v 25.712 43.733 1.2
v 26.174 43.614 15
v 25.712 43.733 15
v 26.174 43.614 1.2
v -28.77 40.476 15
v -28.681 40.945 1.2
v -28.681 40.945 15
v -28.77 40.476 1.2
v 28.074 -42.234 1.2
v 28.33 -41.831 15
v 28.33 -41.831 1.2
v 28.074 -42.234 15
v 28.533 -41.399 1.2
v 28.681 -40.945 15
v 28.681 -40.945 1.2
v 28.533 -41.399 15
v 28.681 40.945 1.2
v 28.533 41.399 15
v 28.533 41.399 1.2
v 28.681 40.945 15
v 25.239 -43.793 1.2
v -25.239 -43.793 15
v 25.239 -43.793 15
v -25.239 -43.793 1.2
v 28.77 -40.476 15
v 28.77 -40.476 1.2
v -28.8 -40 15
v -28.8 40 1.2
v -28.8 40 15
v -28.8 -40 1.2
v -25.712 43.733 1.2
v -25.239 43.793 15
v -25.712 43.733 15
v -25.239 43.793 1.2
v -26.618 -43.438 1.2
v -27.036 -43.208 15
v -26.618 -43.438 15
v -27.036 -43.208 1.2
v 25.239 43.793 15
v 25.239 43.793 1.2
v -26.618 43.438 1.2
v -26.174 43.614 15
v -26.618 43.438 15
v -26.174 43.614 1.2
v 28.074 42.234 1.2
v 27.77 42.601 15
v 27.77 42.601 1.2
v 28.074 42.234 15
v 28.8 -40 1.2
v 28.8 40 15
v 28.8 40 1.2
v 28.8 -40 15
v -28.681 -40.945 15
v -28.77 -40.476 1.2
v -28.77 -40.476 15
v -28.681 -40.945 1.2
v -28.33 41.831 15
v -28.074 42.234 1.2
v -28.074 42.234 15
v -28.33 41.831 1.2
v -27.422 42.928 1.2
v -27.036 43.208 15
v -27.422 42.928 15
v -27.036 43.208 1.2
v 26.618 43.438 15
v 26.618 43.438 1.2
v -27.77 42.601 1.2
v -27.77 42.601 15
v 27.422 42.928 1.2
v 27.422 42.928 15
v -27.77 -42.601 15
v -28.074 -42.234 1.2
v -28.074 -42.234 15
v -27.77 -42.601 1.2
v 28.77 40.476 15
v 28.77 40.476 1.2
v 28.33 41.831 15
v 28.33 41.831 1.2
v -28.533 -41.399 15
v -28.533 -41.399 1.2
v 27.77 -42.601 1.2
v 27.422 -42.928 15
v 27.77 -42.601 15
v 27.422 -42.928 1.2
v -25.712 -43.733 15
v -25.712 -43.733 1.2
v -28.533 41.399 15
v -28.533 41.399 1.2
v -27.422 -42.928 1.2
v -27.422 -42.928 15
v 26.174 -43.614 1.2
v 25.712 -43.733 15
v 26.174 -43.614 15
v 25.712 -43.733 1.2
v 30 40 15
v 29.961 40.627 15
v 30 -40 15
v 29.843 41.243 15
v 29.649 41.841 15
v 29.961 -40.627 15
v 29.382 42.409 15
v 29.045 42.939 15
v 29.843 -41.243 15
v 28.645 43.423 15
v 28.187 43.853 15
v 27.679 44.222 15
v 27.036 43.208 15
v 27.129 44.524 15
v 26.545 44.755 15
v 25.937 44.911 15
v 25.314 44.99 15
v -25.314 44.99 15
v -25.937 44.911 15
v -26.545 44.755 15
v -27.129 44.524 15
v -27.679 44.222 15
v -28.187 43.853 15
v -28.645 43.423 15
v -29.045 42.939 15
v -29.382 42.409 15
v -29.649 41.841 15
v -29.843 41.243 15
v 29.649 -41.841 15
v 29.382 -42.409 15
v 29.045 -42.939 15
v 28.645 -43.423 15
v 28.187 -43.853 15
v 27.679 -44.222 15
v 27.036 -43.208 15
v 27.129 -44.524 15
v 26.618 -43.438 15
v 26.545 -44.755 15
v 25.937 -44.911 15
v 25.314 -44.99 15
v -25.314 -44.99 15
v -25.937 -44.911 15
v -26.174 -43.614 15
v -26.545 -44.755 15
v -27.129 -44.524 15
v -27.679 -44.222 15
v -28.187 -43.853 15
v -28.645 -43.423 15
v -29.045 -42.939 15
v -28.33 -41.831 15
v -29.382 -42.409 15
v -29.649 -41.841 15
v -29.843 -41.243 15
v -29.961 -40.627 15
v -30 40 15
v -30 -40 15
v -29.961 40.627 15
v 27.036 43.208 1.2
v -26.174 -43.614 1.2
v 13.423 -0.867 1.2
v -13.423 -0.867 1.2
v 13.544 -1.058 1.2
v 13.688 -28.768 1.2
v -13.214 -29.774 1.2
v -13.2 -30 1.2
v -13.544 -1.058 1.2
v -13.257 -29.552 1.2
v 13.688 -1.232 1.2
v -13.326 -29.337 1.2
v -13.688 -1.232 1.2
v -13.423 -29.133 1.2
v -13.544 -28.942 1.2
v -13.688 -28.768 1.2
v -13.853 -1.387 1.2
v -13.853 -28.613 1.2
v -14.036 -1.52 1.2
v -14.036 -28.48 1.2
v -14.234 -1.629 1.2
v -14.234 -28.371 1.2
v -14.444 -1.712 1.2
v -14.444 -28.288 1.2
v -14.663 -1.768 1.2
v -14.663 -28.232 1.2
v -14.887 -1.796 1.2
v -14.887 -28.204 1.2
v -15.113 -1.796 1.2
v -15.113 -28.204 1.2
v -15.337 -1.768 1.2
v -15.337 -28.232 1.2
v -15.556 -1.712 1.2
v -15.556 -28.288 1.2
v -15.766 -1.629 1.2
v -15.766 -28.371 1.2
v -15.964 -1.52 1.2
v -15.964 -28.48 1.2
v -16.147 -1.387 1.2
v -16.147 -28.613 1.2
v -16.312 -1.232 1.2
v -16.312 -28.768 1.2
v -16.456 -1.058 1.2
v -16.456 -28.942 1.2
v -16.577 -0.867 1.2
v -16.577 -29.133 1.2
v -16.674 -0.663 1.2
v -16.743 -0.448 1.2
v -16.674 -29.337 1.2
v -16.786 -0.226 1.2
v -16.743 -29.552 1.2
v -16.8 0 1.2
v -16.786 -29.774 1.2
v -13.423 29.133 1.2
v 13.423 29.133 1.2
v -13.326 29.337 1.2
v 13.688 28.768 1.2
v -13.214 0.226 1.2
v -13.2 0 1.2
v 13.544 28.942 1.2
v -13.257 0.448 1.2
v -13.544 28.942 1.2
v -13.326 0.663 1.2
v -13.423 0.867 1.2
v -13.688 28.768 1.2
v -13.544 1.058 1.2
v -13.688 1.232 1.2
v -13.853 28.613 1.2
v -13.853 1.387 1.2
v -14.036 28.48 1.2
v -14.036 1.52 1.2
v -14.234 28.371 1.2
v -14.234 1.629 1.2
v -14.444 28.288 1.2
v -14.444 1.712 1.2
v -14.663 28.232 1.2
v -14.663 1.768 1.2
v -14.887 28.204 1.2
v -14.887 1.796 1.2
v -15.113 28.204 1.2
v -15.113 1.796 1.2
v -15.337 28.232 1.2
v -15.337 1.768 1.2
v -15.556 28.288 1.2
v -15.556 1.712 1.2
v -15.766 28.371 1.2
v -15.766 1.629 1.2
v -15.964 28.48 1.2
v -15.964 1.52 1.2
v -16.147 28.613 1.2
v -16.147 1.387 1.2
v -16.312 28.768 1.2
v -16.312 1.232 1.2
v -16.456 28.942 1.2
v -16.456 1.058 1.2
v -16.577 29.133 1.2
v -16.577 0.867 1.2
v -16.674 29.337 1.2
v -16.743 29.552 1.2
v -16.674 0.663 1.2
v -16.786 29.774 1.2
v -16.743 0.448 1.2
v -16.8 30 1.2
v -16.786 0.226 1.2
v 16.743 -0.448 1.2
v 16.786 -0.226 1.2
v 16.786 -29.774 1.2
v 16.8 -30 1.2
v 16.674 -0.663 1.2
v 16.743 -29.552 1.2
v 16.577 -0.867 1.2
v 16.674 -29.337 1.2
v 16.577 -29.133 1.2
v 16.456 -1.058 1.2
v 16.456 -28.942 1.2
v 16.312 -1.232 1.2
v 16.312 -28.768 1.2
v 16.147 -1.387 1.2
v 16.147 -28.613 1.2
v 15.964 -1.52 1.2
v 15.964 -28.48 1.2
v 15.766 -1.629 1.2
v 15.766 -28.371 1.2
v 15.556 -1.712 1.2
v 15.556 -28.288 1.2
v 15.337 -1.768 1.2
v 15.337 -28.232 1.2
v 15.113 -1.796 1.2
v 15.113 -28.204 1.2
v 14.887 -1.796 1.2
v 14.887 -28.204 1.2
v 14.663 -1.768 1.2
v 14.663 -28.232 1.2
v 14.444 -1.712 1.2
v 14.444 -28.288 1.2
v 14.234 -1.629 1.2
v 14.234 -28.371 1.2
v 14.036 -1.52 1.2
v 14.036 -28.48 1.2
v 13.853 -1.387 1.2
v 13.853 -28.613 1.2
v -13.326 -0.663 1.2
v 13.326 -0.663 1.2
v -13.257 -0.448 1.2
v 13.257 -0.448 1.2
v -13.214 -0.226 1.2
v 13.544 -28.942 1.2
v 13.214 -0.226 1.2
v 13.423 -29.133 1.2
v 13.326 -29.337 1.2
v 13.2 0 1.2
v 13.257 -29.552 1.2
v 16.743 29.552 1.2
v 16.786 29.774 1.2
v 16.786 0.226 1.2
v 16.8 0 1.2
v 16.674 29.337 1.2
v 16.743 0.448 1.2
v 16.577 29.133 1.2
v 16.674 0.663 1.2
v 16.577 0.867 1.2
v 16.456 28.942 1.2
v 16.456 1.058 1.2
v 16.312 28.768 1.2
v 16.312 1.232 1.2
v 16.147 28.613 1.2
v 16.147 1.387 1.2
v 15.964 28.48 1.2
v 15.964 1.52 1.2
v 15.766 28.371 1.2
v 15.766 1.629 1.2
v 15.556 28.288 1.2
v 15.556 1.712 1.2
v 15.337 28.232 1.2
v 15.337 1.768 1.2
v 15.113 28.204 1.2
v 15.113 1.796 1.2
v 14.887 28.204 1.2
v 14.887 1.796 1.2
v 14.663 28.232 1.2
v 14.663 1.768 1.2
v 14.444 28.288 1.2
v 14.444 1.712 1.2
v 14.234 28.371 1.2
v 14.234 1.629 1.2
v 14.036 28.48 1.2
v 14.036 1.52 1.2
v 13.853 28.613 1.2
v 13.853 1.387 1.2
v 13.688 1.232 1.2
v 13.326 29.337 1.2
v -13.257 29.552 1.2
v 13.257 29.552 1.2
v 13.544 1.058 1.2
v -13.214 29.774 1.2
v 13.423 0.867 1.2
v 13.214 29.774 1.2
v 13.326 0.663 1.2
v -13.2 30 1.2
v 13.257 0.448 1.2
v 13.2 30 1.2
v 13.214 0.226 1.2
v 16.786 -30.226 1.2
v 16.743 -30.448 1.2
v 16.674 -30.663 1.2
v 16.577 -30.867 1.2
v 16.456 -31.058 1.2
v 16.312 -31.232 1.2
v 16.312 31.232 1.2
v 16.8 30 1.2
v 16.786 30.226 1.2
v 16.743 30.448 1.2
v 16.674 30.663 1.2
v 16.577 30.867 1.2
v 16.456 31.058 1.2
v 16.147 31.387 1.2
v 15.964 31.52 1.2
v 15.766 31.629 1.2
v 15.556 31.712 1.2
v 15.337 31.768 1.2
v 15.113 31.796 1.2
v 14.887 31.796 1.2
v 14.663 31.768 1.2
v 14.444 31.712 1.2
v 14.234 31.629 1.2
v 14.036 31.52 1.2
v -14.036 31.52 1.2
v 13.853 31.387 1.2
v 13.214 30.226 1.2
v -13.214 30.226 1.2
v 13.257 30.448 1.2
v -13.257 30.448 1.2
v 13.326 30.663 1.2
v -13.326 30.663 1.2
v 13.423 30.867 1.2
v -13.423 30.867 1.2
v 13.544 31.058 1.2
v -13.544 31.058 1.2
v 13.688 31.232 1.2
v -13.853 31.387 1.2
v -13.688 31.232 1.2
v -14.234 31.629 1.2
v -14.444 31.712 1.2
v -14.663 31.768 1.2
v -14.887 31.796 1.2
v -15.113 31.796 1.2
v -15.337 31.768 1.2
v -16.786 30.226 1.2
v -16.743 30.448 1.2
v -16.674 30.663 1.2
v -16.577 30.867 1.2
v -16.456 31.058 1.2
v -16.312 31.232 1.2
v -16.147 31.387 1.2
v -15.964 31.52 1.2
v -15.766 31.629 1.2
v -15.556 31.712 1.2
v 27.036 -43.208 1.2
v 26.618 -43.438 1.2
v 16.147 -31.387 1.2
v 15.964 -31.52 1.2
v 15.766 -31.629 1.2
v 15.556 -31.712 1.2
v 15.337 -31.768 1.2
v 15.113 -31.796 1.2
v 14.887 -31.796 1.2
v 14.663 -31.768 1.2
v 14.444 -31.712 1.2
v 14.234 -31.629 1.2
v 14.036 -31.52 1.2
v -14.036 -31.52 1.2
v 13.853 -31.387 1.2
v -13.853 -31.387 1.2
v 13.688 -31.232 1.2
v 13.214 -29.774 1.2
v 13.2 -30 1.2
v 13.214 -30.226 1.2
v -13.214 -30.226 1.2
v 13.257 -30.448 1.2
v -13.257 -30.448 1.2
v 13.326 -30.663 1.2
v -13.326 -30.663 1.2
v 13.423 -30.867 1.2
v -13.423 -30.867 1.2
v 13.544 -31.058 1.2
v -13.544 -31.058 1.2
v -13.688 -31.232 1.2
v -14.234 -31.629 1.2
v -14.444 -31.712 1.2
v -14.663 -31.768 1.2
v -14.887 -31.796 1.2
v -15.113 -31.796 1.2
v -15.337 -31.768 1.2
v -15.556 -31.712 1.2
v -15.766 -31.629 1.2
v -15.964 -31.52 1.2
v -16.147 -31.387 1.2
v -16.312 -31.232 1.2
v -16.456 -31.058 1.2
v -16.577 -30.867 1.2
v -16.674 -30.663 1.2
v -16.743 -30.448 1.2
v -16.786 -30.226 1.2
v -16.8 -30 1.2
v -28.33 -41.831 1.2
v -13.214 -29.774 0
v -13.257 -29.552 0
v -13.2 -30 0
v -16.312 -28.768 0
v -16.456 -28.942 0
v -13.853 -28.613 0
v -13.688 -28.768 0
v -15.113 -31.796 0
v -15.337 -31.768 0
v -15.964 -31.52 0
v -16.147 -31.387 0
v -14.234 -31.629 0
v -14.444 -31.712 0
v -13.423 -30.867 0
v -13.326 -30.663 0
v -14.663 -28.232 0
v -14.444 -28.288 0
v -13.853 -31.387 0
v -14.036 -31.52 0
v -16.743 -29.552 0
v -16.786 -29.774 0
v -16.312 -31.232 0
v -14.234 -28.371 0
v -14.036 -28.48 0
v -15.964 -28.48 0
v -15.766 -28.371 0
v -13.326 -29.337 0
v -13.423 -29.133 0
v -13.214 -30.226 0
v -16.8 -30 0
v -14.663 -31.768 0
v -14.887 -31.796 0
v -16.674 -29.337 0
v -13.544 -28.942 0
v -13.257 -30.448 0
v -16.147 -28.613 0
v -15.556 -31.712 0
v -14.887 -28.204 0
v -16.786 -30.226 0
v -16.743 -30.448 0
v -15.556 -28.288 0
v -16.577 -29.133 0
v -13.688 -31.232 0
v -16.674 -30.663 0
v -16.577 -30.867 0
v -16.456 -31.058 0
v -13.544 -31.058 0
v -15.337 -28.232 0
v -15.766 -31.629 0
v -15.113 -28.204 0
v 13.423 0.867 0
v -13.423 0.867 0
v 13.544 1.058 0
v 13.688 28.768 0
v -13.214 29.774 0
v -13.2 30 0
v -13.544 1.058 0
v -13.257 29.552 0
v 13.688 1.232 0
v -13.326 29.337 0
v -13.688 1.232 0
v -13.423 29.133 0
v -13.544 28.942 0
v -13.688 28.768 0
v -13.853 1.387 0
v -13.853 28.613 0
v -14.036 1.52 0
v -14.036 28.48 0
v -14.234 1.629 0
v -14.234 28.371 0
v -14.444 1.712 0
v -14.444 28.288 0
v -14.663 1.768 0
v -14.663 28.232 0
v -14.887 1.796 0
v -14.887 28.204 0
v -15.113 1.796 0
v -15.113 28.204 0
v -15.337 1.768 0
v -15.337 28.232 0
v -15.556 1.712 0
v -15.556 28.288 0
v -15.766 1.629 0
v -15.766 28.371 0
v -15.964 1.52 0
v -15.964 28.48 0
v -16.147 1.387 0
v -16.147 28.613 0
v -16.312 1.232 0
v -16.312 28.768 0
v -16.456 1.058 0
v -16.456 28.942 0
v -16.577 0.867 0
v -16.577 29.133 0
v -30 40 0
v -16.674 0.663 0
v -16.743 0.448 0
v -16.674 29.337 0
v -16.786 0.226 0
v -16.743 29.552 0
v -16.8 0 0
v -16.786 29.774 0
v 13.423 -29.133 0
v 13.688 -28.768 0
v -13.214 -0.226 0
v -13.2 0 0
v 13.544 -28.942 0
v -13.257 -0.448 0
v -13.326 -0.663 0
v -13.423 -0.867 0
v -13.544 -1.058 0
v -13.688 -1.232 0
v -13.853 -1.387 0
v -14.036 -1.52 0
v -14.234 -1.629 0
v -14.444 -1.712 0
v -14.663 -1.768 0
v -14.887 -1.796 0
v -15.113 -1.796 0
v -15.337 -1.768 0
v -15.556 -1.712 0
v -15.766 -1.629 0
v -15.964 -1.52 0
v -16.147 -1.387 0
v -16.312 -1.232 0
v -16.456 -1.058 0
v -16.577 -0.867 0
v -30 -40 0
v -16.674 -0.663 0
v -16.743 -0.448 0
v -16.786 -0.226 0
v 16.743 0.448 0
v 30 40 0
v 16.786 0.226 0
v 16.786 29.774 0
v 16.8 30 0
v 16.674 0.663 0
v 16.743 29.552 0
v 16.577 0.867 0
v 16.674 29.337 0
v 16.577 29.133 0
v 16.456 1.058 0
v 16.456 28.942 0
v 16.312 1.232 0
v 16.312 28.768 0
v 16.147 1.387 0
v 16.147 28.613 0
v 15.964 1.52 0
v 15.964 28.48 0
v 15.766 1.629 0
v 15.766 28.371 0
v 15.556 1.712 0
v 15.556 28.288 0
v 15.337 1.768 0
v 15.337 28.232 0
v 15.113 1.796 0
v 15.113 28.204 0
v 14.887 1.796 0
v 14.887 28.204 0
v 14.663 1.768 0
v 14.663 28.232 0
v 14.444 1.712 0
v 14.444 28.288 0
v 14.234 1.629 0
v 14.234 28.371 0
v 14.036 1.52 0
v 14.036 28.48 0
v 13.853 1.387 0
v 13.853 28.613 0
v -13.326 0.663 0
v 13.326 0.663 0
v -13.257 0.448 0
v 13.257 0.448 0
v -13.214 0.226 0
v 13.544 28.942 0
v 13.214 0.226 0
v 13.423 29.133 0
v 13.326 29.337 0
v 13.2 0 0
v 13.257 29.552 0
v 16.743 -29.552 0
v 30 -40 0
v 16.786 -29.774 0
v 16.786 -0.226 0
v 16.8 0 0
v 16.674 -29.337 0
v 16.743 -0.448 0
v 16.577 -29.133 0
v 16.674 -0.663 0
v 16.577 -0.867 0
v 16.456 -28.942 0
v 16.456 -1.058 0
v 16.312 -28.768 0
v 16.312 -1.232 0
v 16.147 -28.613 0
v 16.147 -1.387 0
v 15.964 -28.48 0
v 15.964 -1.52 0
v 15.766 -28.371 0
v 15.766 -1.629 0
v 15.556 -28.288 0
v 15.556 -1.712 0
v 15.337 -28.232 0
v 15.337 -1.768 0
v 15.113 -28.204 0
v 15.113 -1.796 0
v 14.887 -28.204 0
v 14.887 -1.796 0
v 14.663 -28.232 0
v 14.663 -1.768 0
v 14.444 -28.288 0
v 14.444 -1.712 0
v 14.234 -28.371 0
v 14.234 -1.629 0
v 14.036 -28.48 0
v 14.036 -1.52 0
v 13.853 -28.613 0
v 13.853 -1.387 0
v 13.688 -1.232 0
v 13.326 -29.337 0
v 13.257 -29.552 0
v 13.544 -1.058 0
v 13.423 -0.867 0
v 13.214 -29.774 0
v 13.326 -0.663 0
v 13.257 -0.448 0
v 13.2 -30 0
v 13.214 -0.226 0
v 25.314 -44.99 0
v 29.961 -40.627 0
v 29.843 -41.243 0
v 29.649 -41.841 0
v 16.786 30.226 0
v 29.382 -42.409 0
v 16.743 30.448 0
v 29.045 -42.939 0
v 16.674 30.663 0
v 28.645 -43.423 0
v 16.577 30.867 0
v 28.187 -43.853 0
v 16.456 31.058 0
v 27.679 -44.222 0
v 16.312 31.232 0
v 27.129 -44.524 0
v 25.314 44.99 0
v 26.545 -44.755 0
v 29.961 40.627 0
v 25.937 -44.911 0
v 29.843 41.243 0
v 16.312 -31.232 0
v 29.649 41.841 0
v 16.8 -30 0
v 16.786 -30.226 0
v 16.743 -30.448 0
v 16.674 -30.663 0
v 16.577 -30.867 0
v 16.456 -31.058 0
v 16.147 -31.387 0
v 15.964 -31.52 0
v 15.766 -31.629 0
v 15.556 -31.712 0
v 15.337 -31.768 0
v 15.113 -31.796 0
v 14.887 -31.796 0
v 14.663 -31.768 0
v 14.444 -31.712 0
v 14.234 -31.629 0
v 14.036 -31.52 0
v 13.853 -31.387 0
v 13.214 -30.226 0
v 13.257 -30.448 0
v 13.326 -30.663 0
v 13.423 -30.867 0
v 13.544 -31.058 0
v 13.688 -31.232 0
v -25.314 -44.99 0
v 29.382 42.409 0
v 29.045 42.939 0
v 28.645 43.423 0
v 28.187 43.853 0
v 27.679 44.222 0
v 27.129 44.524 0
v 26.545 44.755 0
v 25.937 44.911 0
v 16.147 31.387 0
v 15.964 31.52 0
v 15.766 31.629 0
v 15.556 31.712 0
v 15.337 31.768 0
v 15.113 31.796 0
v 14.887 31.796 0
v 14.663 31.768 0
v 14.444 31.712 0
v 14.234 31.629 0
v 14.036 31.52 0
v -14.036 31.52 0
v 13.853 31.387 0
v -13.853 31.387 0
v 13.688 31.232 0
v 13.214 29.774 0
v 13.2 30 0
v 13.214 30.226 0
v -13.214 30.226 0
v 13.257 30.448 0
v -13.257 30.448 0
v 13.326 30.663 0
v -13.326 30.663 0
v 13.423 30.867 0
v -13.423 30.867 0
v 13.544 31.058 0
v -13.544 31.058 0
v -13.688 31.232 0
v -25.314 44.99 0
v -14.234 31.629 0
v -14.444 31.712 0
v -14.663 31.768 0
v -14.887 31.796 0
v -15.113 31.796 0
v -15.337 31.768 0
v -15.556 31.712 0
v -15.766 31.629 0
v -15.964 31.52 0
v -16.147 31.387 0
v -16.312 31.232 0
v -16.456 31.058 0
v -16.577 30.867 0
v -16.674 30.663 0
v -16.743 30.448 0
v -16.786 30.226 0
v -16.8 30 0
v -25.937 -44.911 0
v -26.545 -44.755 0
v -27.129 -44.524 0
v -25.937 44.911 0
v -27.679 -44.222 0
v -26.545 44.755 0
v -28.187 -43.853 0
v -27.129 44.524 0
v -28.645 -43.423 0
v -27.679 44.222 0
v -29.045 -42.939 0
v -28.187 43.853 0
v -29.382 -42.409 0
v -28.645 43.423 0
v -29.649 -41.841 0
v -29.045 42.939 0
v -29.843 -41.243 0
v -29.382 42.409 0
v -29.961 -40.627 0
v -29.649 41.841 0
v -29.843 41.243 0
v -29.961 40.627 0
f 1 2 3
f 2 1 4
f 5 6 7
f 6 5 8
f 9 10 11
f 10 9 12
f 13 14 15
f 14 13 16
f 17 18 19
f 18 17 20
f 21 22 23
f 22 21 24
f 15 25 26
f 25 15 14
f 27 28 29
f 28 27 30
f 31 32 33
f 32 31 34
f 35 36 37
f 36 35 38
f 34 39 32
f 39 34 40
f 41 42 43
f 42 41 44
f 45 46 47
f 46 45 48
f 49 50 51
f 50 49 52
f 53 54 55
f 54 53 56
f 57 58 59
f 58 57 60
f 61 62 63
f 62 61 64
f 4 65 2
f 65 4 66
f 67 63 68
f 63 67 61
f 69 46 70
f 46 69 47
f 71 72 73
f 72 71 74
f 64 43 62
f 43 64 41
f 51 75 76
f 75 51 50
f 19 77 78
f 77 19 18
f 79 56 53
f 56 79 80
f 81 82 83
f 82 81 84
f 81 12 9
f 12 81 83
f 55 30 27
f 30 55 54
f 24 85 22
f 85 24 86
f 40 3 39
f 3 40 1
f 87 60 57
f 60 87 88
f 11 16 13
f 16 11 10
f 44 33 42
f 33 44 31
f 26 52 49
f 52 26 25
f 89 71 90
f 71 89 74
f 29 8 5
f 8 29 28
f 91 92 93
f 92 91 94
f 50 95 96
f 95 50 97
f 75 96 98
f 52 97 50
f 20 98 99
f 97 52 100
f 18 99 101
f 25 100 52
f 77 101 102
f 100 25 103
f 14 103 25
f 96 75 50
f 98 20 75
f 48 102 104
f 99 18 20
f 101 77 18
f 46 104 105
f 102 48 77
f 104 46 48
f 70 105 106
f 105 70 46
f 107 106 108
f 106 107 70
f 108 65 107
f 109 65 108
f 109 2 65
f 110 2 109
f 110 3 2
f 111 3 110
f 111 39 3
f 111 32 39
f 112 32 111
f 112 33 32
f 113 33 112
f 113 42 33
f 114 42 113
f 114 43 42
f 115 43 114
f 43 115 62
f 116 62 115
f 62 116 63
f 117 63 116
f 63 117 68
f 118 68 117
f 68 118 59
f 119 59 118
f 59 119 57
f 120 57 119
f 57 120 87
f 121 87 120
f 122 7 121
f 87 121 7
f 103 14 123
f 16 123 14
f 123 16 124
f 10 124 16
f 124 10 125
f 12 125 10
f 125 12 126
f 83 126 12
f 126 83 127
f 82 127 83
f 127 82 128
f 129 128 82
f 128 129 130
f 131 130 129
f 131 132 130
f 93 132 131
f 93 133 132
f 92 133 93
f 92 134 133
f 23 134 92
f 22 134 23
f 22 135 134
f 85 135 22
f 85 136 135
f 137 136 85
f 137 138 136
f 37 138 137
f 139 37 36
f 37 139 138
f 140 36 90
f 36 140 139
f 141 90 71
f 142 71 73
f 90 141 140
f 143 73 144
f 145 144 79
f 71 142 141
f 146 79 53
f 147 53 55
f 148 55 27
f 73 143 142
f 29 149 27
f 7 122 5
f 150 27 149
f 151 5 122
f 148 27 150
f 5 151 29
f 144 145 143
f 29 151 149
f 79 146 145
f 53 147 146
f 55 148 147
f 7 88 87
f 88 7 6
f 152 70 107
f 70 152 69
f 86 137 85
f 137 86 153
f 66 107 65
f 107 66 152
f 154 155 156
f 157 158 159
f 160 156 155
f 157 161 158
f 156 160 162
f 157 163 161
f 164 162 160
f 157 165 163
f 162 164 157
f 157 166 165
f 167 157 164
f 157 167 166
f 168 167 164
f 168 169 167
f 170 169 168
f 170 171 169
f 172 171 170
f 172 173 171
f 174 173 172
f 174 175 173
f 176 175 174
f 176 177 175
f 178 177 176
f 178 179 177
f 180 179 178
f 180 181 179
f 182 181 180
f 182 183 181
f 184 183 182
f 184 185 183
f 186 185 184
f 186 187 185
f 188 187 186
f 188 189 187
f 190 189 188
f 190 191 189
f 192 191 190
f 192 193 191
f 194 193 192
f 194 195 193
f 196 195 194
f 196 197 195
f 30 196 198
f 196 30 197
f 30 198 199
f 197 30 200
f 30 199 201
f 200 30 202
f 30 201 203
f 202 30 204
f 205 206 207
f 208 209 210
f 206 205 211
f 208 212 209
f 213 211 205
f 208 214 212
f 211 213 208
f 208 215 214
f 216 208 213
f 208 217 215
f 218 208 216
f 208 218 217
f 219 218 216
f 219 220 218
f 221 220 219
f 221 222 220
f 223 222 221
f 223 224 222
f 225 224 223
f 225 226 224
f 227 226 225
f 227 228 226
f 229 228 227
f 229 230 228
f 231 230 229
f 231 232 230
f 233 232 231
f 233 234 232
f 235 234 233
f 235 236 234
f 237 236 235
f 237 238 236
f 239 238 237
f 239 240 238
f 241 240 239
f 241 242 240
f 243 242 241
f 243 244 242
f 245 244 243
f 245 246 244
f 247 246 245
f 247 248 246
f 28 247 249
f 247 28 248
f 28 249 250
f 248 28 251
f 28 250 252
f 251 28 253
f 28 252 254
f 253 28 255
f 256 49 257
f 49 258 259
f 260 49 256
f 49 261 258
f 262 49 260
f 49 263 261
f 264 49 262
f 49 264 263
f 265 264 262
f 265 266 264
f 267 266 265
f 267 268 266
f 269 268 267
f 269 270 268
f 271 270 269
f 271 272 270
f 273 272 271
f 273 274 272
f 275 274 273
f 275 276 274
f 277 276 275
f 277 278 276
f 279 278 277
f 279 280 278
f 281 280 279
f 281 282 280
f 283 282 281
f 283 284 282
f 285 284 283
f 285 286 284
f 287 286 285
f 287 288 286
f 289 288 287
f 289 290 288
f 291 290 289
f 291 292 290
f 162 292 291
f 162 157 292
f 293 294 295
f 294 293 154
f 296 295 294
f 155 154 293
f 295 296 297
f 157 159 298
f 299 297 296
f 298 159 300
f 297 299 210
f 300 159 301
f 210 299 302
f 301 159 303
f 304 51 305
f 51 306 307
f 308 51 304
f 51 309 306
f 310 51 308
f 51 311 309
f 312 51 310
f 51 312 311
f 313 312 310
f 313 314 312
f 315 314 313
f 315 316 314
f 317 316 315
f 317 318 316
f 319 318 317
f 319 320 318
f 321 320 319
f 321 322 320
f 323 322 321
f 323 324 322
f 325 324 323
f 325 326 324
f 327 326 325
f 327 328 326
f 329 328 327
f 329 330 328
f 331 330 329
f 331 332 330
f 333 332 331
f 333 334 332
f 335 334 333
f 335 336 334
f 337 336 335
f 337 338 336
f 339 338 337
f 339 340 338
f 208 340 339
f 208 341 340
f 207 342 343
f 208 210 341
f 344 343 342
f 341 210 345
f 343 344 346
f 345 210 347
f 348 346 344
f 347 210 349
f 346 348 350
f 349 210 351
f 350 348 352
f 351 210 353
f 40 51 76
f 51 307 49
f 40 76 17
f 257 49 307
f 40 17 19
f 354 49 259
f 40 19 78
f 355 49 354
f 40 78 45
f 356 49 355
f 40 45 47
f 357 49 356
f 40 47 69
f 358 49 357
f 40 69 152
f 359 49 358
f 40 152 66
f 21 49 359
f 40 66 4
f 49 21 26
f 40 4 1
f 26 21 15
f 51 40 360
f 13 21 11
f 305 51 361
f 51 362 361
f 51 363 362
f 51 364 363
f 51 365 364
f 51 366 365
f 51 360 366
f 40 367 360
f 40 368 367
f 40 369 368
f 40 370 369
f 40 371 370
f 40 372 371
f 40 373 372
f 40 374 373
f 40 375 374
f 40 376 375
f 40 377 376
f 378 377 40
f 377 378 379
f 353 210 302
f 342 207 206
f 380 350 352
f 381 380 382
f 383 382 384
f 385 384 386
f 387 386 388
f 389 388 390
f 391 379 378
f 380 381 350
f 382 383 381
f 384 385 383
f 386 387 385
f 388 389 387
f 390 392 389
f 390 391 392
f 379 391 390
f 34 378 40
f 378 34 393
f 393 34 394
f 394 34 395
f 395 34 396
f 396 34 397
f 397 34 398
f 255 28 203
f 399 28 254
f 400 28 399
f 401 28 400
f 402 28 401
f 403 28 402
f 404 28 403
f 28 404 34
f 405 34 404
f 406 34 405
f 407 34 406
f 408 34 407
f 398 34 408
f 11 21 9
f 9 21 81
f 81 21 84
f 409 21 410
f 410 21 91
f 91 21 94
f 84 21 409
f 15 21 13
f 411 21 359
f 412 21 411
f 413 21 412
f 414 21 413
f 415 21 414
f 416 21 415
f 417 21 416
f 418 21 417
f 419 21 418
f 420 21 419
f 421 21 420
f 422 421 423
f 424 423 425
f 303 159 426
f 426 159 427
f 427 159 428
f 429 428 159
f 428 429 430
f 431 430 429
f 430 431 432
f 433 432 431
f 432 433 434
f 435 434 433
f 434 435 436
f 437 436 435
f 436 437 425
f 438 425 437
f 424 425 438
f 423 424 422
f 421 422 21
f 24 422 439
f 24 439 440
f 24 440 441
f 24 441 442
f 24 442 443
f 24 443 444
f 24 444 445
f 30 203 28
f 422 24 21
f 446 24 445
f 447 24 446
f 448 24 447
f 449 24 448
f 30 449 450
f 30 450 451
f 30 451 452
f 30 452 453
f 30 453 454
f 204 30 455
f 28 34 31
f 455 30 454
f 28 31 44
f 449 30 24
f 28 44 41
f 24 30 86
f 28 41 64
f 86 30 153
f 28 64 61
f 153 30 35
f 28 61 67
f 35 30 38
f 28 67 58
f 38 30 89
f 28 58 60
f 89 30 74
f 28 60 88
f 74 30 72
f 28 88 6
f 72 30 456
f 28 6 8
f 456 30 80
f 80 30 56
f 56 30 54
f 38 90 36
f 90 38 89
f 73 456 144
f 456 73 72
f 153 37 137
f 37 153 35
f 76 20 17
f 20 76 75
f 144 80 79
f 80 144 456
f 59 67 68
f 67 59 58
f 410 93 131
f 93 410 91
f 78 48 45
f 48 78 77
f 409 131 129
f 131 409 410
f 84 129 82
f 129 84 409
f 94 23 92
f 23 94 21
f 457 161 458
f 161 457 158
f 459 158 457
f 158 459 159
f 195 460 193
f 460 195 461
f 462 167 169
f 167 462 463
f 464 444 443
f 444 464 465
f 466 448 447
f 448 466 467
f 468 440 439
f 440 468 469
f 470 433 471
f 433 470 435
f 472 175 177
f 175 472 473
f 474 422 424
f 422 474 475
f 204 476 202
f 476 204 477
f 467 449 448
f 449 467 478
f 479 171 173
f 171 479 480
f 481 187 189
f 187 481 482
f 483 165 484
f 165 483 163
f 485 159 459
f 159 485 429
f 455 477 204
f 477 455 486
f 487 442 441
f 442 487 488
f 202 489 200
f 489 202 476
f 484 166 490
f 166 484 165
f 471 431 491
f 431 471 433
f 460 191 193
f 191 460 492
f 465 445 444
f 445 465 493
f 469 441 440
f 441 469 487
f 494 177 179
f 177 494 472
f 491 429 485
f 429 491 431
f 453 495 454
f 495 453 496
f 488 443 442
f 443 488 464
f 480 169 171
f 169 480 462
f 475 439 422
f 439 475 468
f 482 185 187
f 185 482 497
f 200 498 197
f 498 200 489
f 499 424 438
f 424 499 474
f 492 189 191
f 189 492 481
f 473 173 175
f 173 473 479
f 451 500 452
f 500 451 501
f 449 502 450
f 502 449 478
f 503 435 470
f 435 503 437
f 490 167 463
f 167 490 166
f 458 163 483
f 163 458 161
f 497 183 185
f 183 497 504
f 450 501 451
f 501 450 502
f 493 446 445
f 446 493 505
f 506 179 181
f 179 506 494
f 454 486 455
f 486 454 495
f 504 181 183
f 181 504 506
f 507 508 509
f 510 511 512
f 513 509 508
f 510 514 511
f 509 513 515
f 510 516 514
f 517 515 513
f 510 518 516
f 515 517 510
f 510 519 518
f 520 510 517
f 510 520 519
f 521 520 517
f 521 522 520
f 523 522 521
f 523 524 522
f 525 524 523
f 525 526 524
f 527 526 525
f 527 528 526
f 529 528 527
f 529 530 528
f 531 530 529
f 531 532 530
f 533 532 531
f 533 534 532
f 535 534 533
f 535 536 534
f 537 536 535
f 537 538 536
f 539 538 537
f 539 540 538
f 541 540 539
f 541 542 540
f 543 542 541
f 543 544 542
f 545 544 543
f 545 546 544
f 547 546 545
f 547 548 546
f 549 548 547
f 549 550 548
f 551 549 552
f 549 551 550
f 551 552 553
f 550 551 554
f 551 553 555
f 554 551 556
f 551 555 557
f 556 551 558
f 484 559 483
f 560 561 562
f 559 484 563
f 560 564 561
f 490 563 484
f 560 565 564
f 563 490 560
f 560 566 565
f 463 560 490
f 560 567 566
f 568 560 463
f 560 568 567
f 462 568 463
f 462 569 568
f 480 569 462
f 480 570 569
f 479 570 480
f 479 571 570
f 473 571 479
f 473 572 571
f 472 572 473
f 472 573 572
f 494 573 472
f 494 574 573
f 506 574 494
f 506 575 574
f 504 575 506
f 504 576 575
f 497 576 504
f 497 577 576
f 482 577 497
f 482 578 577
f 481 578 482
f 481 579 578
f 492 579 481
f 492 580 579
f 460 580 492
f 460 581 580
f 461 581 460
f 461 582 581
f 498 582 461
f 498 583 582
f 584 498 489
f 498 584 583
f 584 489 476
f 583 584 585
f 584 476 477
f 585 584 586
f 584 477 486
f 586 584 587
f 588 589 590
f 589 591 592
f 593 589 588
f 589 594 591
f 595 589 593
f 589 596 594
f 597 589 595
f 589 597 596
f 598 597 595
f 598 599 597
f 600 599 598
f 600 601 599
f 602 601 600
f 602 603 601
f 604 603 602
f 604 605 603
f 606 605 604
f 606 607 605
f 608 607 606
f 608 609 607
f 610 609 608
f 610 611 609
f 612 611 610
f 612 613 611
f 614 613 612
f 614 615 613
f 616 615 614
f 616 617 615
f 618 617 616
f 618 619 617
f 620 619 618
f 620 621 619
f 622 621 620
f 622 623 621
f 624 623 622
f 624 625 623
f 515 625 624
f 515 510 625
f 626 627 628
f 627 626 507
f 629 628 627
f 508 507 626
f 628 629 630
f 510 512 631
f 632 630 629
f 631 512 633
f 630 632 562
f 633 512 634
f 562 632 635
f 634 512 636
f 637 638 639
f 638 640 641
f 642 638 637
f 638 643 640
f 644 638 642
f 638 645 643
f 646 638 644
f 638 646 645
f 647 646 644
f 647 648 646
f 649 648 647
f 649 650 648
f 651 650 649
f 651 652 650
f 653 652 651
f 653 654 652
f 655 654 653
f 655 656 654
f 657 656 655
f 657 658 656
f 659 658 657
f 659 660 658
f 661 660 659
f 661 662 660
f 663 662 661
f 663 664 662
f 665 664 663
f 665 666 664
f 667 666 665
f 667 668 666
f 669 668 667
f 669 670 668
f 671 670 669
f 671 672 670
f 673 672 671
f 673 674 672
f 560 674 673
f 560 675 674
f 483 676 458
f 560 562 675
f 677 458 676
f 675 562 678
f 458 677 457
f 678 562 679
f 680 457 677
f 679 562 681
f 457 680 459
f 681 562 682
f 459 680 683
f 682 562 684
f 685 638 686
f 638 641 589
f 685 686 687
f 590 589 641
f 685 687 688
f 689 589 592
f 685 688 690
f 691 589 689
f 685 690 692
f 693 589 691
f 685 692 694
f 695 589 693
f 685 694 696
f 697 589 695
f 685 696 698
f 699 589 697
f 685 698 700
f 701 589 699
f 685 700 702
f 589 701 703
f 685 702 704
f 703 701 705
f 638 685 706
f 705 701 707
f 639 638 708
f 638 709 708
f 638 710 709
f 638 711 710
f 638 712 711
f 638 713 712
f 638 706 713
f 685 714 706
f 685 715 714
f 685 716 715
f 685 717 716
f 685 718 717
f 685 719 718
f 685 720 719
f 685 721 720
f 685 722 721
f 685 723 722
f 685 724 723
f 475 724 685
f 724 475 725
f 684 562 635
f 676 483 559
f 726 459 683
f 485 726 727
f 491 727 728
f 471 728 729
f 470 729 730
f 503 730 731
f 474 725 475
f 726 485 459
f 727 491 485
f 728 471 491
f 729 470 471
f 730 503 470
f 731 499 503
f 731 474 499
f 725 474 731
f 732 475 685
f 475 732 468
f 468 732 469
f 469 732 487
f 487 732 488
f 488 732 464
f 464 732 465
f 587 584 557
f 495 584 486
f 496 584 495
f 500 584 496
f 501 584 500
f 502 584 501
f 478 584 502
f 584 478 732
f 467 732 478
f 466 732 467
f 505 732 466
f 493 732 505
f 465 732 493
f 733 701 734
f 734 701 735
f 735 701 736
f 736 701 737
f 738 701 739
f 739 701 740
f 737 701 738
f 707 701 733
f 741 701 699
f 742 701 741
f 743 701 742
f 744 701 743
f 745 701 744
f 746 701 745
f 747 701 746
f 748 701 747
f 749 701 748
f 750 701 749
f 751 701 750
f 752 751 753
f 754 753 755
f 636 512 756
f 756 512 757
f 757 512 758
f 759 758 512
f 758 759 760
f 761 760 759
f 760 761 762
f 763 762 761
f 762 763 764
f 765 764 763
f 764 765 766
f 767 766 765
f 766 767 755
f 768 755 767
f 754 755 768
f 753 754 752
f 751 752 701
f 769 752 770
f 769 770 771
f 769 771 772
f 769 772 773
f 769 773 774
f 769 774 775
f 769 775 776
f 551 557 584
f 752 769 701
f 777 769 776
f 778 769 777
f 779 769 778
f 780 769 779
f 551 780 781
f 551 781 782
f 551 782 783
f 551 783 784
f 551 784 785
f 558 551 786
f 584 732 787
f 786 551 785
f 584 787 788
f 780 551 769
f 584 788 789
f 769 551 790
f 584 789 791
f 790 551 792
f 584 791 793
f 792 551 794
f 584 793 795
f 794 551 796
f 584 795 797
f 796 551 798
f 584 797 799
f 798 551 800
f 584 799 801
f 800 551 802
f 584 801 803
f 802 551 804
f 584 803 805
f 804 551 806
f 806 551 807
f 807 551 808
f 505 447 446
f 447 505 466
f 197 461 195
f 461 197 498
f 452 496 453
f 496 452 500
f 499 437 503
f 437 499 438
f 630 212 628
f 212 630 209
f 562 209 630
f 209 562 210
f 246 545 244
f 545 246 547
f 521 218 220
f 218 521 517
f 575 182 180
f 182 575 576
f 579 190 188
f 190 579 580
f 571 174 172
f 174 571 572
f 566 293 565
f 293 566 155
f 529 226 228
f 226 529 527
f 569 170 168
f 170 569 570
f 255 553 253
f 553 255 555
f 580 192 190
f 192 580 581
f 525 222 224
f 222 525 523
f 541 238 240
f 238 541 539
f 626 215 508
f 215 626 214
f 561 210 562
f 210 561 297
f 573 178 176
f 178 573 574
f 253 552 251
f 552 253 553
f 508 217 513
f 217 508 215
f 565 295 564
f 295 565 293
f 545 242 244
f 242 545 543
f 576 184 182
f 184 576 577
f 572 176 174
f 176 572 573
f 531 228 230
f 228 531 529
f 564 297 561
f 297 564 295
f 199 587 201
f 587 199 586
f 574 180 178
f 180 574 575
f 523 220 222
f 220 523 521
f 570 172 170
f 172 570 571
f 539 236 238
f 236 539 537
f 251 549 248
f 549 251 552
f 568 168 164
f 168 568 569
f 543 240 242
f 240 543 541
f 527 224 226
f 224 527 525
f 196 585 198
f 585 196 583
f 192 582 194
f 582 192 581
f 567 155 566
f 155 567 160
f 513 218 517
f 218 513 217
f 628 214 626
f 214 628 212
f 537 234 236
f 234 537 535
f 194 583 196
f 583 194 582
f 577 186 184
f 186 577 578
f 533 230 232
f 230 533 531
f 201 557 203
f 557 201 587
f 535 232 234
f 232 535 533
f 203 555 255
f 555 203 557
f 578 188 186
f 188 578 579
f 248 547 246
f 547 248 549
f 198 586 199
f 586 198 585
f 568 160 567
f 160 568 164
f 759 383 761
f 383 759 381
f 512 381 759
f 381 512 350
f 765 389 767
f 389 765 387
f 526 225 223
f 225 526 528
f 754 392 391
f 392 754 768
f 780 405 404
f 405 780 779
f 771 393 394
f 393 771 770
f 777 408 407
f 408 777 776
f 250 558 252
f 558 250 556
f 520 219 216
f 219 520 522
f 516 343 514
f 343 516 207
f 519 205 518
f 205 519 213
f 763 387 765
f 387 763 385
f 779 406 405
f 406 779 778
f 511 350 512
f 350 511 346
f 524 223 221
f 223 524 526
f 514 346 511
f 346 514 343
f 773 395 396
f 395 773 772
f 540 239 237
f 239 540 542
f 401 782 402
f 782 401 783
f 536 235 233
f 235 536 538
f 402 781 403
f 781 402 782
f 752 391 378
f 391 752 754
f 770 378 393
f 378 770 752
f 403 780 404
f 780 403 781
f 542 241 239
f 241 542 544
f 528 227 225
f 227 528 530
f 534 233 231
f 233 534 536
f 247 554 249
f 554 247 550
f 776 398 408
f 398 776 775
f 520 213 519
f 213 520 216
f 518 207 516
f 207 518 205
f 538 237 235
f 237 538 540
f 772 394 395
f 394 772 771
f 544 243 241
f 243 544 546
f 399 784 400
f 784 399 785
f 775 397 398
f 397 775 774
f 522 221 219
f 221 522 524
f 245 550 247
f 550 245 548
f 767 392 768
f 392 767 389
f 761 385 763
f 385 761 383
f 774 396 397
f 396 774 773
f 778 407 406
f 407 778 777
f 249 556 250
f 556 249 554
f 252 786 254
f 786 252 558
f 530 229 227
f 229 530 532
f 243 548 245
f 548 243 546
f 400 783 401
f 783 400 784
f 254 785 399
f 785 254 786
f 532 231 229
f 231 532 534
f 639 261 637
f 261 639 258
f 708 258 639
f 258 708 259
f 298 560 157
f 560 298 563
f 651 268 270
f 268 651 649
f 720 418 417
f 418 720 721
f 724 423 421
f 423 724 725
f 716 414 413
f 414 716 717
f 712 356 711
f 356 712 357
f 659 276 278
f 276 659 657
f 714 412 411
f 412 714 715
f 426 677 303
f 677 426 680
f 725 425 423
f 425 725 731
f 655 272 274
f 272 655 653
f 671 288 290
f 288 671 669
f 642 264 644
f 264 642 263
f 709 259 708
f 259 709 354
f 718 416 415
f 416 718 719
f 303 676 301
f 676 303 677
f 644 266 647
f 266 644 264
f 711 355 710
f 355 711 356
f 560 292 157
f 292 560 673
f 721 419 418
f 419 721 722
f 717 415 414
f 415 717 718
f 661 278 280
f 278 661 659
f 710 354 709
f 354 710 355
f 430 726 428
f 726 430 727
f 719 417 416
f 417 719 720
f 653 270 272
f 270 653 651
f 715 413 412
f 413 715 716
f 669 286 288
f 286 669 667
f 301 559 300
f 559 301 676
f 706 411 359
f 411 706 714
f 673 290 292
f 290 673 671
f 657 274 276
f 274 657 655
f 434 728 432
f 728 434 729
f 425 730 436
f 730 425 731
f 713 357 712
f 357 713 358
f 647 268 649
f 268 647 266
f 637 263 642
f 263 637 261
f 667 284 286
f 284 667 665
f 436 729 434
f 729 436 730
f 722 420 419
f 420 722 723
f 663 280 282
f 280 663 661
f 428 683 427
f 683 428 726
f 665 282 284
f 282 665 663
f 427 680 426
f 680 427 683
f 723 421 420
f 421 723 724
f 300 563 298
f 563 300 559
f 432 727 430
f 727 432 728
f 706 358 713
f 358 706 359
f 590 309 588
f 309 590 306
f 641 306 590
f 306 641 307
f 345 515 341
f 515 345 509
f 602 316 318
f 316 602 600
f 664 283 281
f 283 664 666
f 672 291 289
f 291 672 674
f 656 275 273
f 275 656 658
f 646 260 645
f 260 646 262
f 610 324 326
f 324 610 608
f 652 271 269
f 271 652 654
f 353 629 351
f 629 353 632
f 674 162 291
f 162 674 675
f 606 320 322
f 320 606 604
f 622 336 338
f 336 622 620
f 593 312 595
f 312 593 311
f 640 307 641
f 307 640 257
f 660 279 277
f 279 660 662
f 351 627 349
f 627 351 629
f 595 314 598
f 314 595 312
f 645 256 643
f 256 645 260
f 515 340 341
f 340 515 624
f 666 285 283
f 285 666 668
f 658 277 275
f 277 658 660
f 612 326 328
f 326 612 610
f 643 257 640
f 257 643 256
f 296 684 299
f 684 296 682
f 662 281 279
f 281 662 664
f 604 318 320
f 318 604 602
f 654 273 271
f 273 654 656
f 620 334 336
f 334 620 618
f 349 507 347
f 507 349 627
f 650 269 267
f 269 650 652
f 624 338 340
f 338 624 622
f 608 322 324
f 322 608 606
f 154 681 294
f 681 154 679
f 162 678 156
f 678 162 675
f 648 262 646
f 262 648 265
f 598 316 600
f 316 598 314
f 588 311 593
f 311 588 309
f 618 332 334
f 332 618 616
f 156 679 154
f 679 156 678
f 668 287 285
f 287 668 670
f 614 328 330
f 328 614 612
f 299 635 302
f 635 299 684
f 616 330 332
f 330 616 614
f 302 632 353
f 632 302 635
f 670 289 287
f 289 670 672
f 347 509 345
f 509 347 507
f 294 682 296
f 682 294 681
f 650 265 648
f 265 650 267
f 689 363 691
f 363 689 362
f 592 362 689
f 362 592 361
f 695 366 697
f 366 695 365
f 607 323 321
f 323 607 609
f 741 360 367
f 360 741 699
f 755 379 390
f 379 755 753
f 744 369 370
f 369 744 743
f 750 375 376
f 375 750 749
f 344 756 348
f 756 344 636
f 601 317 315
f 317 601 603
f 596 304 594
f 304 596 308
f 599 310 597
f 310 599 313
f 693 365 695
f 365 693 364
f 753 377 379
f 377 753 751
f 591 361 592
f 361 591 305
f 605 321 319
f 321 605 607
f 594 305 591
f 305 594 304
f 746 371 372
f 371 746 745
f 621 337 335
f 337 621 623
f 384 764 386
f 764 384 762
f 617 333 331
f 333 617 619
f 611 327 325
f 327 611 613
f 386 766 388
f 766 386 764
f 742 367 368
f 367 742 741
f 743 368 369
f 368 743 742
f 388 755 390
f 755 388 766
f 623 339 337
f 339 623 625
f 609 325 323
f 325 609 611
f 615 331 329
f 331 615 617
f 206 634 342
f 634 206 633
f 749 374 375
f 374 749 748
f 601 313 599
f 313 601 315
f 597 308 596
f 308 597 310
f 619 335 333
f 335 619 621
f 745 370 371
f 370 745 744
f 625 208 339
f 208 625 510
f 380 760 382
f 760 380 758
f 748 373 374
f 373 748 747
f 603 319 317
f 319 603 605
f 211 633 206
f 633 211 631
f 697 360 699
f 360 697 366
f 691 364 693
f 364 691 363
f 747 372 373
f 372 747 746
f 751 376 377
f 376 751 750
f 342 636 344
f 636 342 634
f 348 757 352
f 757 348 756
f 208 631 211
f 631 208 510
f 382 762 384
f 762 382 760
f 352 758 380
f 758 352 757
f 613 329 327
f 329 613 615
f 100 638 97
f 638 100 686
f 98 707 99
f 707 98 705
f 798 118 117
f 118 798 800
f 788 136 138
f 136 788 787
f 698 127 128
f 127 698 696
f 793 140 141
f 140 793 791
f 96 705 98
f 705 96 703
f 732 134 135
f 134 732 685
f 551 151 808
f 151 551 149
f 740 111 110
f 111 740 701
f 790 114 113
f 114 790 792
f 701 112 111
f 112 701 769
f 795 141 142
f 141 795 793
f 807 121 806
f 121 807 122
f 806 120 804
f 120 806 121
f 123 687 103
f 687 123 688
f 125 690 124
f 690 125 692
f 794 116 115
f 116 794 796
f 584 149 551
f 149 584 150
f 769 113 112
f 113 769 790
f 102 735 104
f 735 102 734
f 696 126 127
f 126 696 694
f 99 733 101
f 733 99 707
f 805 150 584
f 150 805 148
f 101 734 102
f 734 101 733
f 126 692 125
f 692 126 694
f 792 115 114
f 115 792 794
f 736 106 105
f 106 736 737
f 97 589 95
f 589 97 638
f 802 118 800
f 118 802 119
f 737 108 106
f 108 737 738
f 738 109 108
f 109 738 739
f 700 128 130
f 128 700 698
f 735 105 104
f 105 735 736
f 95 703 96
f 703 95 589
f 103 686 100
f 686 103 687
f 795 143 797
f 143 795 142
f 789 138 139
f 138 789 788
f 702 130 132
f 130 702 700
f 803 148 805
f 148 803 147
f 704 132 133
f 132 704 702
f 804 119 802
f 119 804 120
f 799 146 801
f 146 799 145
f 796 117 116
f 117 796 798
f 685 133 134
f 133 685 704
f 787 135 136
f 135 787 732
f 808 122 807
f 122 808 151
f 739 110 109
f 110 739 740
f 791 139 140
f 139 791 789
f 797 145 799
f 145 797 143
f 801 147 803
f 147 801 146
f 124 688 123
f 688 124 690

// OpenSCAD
$fn = 50;


difference() {
	union() {
		hull() {
			translate(v = [-25.0000000000, 40.0000000000, 0]) {
				cylinder(h = 15, r = 5);
			}
			translate(v = [25.0000000000, 40.0000000000, 0]) {
				cylinder(h = 15, r = 5);
			}
			translate(v = [-25.0000000000, -40.0000000000, 0]) {
				cylinder(h = 15, r = 5);
			}
			translate(v = [25.0000000000, -40.0000000000, 0]) {
				cylinder(h = 15, r = 5);
			}
		}
	}
	union() {
		translate(v = [0, 0, 1.2000000000]) {
			hull() {
				translate(v = [-25.0000000000, 40.0000000000, 0]) {
					cylinder(h = 13.8000000000, r = 3.8000000000);
				}
				translate(v = [25.0000000000, 40.0000000000, 0]) {
					cylinder(h = 13.8000000000, r = 3.8000000000);
				}
				translate(v = [-25.0000000000, -40.0000000000, 0]) {
					cylinder(h = 13.8000000000, r = 3.8000000000);
				}
				translate(v = [25.0000000000, -40.0000000000, 0]) {
					cylinder(h = 13.8000000000, r = 3.8000000000);
				}
			}
		}
		#translate(v = [-15.0000000000, -30.0000000000, 0]) {
			cylinder(h = 1.2000000000, r = 1.8000000000);
		}
		#translate(v = [-15.0000000000, 0.0000000000, 0]) {
			cylinder(h = 1.2000000000, r = 1.8000000000);
		}
		#translate(v = [-15.0000000000, 30.0000000000, 0]) {
			cylinder(h = 1.2000000000, r = 1.8000000000);
		}
		#translate(v = [15.0000000000, -30.0000000000, 0]) {
			cylinder(h = 1.2000000000, r = 1.8000000000);
		}
		#translate(v = [15.0000000000, 0.0000000000, 0]) {
			cylinder(h = 1.2000000000, r = 1.8000000000);
		}
		#translate(v = [15.0000000000, 30.0000000000, 0]) {
			cylinder(h = 1.2000000000, r = 1.8000000000);
		}
	}
}
